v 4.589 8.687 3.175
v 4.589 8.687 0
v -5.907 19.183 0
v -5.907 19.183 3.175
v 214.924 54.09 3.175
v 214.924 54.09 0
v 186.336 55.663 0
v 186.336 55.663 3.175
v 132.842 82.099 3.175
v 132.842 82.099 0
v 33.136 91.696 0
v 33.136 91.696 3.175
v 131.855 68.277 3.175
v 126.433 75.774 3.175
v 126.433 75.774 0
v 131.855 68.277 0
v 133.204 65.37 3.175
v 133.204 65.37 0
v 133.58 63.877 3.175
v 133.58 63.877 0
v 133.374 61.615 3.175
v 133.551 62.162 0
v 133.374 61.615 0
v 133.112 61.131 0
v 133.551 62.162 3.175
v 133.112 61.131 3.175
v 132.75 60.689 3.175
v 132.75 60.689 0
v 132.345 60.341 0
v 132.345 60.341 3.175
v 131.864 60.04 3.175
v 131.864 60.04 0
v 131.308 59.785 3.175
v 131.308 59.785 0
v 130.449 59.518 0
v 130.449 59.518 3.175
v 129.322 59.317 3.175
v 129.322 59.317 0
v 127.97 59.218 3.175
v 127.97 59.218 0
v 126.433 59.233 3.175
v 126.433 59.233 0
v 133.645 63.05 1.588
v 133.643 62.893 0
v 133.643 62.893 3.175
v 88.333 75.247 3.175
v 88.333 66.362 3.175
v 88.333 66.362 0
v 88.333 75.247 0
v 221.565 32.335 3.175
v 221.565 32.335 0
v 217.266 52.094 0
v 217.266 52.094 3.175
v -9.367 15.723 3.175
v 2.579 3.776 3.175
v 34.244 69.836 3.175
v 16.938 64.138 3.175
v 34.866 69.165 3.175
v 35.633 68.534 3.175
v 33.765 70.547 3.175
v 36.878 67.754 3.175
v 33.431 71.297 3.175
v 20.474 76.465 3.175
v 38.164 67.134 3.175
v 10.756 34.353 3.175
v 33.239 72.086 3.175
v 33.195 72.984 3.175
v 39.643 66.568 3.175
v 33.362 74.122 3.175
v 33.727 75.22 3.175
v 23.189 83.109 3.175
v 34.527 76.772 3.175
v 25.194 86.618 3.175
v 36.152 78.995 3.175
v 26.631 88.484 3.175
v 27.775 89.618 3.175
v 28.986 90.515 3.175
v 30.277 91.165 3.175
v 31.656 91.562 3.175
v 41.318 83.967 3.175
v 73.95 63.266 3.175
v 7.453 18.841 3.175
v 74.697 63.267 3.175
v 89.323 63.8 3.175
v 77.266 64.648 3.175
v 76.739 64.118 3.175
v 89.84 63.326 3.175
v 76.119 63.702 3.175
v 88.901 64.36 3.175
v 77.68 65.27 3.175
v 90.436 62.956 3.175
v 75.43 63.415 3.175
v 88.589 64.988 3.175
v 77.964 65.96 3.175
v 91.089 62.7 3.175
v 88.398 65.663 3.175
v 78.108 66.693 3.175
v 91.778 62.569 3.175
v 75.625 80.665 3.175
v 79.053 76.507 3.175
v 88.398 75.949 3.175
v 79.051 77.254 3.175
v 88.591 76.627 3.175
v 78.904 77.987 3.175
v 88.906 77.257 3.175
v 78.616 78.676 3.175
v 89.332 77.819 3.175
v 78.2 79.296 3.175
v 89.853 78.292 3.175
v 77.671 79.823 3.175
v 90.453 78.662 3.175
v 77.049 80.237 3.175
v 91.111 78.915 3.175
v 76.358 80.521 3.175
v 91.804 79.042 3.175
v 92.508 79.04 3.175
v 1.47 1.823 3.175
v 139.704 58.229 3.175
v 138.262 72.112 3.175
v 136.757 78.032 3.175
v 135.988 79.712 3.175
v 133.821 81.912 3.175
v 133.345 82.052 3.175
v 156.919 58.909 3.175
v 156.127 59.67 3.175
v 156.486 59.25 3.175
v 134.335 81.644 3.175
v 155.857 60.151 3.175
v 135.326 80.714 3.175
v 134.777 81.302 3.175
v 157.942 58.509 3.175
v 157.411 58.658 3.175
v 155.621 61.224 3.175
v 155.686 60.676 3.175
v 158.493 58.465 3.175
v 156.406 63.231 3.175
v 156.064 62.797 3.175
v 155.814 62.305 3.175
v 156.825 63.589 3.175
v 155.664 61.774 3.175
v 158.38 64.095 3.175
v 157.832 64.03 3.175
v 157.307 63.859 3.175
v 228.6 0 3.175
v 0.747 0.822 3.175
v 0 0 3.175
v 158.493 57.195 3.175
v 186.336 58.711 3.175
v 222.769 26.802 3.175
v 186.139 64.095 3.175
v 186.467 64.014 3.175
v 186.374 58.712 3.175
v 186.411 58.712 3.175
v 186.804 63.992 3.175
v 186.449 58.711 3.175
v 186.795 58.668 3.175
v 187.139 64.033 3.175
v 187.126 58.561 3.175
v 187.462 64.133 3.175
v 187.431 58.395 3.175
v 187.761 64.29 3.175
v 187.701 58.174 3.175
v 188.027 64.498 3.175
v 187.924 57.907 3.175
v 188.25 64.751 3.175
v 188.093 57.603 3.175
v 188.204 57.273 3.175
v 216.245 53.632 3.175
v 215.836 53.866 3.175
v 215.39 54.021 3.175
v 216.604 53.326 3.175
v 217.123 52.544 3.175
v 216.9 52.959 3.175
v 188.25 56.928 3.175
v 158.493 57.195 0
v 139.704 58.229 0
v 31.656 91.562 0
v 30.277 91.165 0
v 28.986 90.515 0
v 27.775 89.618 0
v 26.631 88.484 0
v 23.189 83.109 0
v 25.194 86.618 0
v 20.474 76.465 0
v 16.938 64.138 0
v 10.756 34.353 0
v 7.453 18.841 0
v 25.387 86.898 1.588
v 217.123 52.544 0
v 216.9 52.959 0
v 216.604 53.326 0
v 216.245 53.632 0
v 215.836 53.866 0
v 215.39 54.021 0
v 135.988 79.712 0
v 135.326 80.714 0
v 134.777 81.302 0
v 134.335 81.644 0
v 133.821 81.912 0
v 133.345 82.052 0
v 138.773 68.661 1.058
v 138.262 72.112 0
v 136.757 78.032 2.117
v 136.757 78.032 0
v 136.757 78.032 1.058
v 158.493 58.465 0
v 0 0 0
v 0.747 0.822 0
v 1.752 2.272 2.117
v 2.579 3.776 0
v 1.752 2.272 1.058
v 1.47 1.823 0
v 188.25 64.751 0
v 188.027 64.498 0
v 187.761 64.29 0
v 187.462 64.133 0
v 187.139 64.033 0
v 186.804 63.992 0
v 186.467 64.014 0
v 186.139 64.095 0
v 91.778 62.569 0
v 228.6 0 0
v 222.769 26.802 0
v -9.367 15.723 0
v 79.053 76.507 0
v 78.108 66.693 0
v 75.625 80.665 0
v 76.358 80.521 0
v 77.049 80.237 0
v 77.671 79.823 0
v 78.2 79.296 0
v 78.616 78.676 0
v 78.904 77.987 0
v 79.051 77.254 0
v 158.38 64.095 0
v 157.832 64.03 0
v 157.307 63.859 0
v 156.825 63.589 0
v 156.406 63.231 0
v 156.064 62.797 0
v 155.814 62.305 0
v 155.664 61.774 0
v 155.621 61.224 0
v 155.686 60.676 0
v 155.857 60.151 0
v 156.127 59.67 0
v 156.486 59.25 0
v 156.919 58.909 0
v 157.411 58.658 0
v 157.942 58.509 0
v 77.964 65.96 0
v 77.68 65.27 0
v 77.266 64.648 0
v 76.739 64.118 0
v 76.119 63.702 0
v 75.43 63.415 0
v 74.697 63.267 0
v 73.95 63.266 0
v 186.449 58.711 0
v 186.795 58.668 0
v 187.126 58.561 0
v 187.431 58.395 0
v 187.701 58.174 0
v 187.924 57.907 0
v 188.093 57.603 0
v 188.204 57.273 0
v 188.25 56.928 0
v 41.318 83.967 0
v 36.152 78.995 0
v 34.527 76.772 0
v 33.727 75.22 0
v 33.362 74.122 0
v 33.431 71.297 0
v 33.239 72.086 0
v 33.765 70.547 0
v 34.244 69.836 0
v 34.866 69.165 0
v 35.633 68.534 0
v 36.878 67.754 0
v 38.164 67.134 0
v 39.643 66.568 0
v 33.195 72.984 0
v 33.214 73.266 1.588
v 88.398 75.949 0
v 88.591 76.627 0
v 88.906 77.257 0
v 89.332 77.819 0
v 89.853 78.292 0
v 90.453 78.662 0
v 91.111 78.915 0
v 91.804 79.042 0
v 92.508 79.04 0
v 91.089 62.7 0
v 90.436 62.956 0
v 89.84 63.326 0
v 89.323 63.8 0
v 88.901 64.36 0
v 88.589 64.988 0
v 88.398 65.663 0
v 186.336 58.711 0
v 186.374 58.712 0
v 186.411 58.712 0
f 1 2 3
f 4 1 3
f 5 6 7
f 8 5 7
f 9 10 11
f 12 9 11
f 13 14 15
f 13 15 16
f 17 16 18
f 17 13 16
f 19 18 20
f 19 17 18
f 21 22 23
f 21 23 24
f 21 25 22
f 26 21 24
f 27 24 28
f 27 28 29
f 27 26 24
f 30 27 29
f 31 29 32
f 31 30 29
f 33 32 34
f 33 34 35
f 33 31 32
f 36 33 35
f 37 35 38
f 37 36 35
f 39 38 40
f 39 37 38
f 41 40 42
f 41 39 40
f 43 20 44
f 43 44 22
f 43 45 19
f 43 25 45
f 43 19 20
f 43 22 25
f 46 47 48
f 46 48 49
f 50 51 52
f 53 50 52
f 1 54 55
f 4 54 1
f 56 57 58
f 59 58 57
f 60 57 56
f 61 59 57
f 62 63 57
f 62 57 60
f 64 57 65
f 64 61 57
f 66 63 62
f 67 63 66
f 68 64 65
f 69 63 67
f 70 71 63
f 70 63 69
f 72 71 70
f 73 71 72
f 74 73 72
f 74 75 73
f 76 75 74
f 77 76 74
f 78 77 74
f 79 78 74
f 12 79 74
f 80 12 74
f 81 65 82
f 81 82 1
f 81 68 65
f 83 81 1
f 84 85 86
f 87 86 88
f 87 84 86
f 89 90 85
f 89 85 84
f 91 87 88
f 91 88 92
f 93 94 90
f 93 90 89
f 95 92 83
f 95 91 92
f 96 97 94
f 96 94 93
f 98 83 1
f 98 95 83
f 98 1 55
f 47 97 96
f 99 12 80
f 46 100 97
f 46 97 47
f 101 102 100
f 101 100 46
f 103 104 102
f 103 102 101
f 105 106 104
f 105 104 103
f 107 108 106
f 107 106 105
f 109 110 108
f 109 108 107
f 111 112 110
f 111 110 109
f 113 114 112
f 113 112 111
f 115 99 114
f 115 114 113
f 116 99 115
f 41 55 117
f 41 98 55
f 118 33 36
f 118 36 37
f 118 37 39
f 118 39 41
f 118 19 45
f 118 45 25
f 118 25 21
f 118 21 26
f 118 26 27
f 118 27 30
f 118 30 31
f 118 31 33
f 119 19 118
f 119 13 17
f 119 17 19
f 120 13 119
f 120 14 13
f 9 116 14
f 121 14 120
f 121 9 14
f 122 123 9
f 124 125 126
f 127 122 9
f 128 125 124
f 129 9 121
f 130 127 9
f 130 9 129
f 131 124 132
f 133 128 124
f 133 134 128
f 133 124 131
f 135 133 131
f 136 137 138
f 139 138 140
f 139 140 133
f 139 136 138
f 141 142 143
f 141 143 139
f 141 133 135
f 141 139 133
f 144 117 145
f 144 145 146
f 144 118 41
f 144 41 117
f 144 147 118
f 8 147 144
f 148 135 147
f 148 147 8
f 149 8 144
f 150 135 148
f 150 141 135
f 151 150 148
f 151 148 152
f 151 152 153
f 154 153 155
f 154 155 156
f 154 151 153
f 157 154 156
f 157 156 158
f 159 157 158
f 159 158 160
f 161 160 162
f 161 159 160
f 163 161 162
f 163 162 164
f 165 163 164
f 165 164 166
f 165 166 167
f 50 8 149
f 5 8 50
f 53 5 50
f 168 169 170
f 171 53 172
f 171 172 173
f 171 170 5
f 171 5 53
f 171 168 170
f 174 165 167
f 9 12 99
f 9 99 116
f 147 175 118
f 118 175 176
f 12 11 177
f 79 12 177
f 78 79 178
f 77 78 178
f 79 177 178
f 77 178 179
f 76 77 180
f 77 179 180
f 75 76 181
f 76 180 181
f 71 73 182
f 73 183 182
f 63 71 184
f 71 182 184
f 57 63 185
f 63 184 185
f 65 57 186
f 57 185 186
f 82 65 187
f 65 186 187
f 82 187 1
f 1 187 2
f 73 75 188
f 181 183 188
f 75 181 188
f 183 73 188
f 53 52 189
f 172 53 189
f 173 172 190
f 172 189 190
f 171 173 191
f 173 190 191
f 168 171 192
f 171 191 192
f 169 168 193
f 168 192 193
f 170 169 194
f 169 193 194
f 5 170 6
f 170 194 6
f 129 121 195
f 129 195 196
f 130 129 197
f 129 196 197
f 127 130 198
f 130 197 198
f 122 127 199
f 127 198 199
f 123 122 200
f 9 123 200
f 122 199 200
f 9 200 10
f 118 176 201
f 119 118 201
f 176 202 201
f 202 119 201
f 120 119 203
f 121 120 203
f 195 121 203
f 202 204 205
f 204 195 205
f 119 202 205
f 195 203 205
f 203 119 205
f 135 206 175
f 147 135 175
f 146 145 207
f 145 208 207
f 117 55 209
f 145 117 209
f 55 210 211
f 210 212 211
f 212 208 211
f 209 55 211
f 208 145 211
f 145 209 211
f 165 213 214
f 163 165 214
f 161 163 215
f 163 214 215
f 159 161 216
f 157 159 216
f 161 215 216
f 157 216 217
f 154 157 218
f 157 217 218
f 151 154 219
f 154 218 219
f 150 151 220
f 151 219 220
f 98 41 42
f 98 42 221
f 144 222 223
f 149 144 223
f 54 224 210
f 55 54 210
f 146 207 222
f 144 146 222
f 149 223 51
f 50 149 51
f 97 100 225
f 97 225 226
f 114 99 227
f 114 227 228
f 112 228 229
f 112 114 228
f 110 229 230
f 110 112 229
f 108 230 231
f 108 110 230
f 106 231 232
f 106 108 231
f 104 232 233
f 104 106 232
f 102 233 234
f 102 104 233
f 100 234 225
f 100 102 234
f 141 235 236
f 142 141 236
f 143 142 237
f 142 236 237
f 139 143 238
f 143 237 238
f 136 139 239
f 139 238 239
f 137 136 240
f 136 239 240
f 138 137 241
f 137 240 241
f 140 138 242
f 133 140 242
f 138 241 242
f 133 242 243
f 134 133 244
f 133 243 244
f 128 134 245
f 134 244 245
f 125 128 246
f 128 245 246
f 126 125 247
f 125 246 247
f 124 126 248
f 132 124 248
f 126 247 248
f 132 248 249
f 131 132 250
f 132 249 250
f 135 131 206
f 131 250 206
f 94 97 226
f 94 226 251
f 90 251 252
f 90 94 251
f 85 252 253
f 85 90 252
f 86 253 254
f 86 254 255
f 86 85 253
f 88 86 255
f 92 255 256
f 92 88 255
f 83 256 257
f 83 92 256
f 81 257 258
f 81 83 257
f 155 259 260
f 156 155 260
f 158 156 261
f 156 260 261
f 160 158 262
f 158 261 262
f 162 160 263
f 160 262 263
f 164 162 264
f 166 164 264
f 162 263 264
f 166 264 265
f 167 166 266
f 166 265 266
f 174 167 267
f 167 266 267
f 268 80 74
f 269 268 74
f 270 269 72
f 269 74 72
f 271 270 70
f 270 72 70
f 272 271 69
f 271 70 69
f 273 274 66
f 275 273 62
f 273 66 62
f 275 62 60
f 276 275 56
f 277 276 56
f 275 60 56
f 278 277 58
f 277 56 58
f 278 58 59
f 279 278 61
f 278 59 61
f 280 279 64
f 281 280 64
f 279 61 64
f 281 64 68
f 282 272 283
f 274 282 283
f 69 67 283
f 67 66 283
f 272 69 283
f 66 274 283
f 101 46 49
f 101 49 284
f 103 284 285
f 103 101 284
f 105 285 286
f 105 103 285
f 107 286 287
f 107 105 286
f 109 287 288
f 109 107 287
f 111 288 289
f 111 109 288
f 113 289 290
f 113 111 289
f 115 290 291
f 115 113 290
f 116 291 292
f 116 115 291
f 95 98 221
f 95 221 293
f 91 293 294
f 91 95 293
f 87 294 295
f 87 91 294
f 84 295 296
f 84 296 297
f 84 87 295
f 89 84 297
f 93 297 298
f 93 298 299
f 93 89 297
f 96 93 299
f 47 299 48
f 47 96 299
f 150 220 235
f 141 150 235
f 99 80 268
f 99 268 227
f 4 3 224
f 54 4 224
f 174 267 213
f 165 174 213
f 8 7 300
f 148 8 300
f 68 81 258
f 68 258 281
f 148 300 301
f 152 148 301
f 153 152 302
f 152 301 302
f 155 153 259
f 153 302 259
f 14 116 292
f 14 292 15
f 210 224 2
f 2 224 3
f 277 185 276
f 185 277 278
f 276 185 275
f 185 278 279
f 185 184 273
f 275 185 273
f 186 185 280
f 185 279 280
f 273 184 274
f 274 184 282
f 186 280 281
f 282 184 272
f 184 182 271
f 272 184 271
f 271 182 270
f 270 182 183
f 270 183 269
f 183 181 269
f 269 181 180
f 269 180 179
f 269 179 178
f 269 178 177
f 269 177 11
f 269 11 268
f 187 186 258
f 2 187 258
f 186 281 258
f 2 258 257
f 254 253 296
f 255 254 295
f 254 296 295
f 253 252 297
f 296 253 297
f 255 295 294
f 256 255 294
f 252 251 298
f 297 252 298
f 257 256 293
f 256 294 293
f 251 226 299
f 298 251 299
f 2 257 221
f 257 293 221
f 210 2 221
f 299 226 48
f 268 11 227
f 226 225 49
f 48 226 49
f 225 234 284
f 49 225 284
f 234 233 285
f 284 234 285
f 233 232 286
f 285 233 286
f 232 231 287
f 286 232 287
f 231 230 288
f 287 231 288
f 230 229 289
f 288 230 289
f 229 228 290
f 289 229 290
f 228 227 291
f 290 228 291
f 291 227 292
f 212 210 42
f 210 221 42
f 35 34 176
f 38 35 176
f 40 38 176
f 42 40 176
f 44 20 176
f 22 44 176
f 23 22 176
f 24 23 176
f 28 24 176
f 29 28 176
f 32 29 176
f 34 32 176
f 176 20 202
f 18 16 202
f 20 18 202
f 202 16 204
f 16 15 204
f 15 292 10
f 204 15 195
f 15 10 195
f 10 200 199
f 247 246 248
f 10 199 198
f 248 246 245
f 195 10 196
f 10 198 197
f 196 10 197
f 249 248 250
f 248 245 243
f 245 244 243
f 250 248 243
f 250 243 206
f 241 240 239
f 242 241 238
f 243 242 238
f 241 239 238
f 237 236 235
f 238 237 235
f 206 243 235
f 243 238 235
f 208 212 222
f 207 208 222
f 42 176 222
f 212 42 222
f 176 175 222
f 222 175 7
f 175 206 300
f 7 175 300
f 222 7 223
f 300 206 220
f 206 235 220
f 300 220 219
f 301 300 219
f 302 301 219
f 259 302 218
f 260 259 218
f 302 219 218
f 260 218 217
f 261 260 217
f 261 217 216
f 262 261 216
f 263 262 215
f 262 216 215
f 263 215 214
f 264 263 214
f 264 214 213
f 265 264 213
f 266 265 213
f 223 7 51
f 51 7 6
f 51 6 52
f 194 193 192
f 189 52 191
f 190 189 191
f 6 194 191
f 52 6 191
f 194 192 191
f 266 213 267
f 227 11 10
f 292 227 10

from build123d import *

# Parameters (mm, degrees)
BOSS_EXTRUDE1_DEPTH = 3.175
CUT_EXTRUDE1_DEPTH  = 3.175


with BuildPart() as part:
    # Sketch1 → Boss-Extrude1 (new body)
    with BuildSketch(Plane.XY):
        with BuildLine():
            add(Edge.make_bspline(
                [(2.579059818, 3.776412267), (1.767727302, 2.156821837), (0.911850586, 0.875503614), (0, 0)],
                knots=[0.923802309, 0.923802309, 0.923802309, 0.923802309, 1, 1, 1, 1], degree=3))
            Line((0, 0), (228.6, 0))
            Line((228.6, 0), (222.76882451, 26.801768915))
            Line((222.76882451, 26.801768915), (221.564922434, 32.335251021))
            Line((221.564922434, 32.335251021), (217.266059518, 52.094068206))
            ThreePointArc((217.266059518, 52.094068206), (216.431616334, 53.487306889), (214.923678652, 54.090244201))
            Line((214.923678652, 54.090244201), (186.335881614, 55.663335735))
            Line((186.335881614, 55.663335735), (186.335881614, 58.711335735))
            ThreePointArc((186.335881614, 58.711335735), (186.392581362, 58.712200587), (186.449281111, 58.711335735))
            ThreePointArc((186.449281111, 58.711335735), (187.700530121, 58.174263199), (188.250106948, 56.928455707))
            Line((188.250106948, 56.928455707), (188.250106948, 64.751418591))
            ThreePointArc((188.250106948, 64.751418591), (187.302878972, 64.075530467), (186.139401367, 64.095163563))
            Line((186.139401367, 64.095163563), (158.379745694, 64.095163563))
            ThreePointArc((158.379745694, 64.095163563), (155.621285283, 61.22392358), (158.492525265, 58.46546317))
            Line((158.492525265, 58.46546317), (158.492525265, 57.19546317))
            Line((158.492525265, 57.19546317), (139.704230031, 58.229320662))
            add(Edge.make_bspline(
                [(139.704230031, 58.229320662), (139.045260228, 67.775421627), (137.97702794, 82.099142771), (132.841802065, 82.099142771)],
                knots=[0, 0, 0, 0, 1, 1, 1, 1], degree=3))
            Line((132.841802065, 82.099142771), (33.135927245, 91.696329699))
            add(Edge.make_bspline(
                [(33.135927245, 91.696329699), (29.992946755, 91.696329699), (16.218901468, 82.07109656), (11.469233026, 28.631681198), (4.58927934, 8.68731164)],
                knots=[0, 0, 0, 0, 0.15232143, 0.857980154, 0.857980154, 0.857980154, 0.857980154], degree=3))
            Line((4.58927934, 8.68731164), (-5.906819212, 19.183410193))
            Line((-5.906819212, 19.183410193), (-9.36737866, 15.722850745))
            Line((-9.36737866, 15.722850745), (2.579059818, 3.776412267))
        make_face()
    extrude(amount=BOSS_EXTRUDE1_DEPTH)

    # Sketch2 → Cut-Extrude1 (cut)
    with BuildSketch(Plane.XY.offset(3.175)):
        with BuildLine():
            Line((41.317655172, 83.967201614), (75.625183332, 80.664931197))
            ThreePointArc((75.625183332, 80.664931197), (78.199946888, 79.296016613), (79.052610873, 76.507415058))
            Line((79.052610873, 76.507415058), (78.107945762, 66.693220334))
            ThreePointArc((78.107945762, 66.693220334), (76.739031178, 64.118456778), (73.950429623, 63.265792793))
            Line((73.950429623, 63.265792793), (39.642901463, 66.568063209))
            add(Edge.make_bspline(
                [(41.317655172, 83.967201614), (25.947965106, 71.264134292), (39.642901463, 66.568063209)],
                knots=[0, 0, 0, 1, 1, 1], degree=2))
        make_face()
        with BuildLine():
            Line((92.508115474, 79.039864911), (126.433071175, 75.774418999))
            add(Edge.make_bspline(
                [(126.433071175, 75.774418999), (140.857755692, 58.596738855), (126.433071175, 59.233433778)],
                knots=[0, 0, 0, 1, 1, 1], degree=2))
            Line((126.433071175, 59.233433778), (91.778026876, 62.569154354))
            ThreePointArc((91.778026876, 62.569154354), (89.322883346, 63.799861058), (88.333071175, 66.361626194))
            Line((88.333071175, 66.361626194), (88.333071175, 75.247393071))
            ThreePointArc((88.333071175, 75.247393071), (89.581306039, 78.0675809), (92.508115474, 79.039864911))
        make_face()
    extrude(amount=-CUT_EXTRUDE1_DEPTH, mode=Mode.SUBTRACT)


solid = part.part
